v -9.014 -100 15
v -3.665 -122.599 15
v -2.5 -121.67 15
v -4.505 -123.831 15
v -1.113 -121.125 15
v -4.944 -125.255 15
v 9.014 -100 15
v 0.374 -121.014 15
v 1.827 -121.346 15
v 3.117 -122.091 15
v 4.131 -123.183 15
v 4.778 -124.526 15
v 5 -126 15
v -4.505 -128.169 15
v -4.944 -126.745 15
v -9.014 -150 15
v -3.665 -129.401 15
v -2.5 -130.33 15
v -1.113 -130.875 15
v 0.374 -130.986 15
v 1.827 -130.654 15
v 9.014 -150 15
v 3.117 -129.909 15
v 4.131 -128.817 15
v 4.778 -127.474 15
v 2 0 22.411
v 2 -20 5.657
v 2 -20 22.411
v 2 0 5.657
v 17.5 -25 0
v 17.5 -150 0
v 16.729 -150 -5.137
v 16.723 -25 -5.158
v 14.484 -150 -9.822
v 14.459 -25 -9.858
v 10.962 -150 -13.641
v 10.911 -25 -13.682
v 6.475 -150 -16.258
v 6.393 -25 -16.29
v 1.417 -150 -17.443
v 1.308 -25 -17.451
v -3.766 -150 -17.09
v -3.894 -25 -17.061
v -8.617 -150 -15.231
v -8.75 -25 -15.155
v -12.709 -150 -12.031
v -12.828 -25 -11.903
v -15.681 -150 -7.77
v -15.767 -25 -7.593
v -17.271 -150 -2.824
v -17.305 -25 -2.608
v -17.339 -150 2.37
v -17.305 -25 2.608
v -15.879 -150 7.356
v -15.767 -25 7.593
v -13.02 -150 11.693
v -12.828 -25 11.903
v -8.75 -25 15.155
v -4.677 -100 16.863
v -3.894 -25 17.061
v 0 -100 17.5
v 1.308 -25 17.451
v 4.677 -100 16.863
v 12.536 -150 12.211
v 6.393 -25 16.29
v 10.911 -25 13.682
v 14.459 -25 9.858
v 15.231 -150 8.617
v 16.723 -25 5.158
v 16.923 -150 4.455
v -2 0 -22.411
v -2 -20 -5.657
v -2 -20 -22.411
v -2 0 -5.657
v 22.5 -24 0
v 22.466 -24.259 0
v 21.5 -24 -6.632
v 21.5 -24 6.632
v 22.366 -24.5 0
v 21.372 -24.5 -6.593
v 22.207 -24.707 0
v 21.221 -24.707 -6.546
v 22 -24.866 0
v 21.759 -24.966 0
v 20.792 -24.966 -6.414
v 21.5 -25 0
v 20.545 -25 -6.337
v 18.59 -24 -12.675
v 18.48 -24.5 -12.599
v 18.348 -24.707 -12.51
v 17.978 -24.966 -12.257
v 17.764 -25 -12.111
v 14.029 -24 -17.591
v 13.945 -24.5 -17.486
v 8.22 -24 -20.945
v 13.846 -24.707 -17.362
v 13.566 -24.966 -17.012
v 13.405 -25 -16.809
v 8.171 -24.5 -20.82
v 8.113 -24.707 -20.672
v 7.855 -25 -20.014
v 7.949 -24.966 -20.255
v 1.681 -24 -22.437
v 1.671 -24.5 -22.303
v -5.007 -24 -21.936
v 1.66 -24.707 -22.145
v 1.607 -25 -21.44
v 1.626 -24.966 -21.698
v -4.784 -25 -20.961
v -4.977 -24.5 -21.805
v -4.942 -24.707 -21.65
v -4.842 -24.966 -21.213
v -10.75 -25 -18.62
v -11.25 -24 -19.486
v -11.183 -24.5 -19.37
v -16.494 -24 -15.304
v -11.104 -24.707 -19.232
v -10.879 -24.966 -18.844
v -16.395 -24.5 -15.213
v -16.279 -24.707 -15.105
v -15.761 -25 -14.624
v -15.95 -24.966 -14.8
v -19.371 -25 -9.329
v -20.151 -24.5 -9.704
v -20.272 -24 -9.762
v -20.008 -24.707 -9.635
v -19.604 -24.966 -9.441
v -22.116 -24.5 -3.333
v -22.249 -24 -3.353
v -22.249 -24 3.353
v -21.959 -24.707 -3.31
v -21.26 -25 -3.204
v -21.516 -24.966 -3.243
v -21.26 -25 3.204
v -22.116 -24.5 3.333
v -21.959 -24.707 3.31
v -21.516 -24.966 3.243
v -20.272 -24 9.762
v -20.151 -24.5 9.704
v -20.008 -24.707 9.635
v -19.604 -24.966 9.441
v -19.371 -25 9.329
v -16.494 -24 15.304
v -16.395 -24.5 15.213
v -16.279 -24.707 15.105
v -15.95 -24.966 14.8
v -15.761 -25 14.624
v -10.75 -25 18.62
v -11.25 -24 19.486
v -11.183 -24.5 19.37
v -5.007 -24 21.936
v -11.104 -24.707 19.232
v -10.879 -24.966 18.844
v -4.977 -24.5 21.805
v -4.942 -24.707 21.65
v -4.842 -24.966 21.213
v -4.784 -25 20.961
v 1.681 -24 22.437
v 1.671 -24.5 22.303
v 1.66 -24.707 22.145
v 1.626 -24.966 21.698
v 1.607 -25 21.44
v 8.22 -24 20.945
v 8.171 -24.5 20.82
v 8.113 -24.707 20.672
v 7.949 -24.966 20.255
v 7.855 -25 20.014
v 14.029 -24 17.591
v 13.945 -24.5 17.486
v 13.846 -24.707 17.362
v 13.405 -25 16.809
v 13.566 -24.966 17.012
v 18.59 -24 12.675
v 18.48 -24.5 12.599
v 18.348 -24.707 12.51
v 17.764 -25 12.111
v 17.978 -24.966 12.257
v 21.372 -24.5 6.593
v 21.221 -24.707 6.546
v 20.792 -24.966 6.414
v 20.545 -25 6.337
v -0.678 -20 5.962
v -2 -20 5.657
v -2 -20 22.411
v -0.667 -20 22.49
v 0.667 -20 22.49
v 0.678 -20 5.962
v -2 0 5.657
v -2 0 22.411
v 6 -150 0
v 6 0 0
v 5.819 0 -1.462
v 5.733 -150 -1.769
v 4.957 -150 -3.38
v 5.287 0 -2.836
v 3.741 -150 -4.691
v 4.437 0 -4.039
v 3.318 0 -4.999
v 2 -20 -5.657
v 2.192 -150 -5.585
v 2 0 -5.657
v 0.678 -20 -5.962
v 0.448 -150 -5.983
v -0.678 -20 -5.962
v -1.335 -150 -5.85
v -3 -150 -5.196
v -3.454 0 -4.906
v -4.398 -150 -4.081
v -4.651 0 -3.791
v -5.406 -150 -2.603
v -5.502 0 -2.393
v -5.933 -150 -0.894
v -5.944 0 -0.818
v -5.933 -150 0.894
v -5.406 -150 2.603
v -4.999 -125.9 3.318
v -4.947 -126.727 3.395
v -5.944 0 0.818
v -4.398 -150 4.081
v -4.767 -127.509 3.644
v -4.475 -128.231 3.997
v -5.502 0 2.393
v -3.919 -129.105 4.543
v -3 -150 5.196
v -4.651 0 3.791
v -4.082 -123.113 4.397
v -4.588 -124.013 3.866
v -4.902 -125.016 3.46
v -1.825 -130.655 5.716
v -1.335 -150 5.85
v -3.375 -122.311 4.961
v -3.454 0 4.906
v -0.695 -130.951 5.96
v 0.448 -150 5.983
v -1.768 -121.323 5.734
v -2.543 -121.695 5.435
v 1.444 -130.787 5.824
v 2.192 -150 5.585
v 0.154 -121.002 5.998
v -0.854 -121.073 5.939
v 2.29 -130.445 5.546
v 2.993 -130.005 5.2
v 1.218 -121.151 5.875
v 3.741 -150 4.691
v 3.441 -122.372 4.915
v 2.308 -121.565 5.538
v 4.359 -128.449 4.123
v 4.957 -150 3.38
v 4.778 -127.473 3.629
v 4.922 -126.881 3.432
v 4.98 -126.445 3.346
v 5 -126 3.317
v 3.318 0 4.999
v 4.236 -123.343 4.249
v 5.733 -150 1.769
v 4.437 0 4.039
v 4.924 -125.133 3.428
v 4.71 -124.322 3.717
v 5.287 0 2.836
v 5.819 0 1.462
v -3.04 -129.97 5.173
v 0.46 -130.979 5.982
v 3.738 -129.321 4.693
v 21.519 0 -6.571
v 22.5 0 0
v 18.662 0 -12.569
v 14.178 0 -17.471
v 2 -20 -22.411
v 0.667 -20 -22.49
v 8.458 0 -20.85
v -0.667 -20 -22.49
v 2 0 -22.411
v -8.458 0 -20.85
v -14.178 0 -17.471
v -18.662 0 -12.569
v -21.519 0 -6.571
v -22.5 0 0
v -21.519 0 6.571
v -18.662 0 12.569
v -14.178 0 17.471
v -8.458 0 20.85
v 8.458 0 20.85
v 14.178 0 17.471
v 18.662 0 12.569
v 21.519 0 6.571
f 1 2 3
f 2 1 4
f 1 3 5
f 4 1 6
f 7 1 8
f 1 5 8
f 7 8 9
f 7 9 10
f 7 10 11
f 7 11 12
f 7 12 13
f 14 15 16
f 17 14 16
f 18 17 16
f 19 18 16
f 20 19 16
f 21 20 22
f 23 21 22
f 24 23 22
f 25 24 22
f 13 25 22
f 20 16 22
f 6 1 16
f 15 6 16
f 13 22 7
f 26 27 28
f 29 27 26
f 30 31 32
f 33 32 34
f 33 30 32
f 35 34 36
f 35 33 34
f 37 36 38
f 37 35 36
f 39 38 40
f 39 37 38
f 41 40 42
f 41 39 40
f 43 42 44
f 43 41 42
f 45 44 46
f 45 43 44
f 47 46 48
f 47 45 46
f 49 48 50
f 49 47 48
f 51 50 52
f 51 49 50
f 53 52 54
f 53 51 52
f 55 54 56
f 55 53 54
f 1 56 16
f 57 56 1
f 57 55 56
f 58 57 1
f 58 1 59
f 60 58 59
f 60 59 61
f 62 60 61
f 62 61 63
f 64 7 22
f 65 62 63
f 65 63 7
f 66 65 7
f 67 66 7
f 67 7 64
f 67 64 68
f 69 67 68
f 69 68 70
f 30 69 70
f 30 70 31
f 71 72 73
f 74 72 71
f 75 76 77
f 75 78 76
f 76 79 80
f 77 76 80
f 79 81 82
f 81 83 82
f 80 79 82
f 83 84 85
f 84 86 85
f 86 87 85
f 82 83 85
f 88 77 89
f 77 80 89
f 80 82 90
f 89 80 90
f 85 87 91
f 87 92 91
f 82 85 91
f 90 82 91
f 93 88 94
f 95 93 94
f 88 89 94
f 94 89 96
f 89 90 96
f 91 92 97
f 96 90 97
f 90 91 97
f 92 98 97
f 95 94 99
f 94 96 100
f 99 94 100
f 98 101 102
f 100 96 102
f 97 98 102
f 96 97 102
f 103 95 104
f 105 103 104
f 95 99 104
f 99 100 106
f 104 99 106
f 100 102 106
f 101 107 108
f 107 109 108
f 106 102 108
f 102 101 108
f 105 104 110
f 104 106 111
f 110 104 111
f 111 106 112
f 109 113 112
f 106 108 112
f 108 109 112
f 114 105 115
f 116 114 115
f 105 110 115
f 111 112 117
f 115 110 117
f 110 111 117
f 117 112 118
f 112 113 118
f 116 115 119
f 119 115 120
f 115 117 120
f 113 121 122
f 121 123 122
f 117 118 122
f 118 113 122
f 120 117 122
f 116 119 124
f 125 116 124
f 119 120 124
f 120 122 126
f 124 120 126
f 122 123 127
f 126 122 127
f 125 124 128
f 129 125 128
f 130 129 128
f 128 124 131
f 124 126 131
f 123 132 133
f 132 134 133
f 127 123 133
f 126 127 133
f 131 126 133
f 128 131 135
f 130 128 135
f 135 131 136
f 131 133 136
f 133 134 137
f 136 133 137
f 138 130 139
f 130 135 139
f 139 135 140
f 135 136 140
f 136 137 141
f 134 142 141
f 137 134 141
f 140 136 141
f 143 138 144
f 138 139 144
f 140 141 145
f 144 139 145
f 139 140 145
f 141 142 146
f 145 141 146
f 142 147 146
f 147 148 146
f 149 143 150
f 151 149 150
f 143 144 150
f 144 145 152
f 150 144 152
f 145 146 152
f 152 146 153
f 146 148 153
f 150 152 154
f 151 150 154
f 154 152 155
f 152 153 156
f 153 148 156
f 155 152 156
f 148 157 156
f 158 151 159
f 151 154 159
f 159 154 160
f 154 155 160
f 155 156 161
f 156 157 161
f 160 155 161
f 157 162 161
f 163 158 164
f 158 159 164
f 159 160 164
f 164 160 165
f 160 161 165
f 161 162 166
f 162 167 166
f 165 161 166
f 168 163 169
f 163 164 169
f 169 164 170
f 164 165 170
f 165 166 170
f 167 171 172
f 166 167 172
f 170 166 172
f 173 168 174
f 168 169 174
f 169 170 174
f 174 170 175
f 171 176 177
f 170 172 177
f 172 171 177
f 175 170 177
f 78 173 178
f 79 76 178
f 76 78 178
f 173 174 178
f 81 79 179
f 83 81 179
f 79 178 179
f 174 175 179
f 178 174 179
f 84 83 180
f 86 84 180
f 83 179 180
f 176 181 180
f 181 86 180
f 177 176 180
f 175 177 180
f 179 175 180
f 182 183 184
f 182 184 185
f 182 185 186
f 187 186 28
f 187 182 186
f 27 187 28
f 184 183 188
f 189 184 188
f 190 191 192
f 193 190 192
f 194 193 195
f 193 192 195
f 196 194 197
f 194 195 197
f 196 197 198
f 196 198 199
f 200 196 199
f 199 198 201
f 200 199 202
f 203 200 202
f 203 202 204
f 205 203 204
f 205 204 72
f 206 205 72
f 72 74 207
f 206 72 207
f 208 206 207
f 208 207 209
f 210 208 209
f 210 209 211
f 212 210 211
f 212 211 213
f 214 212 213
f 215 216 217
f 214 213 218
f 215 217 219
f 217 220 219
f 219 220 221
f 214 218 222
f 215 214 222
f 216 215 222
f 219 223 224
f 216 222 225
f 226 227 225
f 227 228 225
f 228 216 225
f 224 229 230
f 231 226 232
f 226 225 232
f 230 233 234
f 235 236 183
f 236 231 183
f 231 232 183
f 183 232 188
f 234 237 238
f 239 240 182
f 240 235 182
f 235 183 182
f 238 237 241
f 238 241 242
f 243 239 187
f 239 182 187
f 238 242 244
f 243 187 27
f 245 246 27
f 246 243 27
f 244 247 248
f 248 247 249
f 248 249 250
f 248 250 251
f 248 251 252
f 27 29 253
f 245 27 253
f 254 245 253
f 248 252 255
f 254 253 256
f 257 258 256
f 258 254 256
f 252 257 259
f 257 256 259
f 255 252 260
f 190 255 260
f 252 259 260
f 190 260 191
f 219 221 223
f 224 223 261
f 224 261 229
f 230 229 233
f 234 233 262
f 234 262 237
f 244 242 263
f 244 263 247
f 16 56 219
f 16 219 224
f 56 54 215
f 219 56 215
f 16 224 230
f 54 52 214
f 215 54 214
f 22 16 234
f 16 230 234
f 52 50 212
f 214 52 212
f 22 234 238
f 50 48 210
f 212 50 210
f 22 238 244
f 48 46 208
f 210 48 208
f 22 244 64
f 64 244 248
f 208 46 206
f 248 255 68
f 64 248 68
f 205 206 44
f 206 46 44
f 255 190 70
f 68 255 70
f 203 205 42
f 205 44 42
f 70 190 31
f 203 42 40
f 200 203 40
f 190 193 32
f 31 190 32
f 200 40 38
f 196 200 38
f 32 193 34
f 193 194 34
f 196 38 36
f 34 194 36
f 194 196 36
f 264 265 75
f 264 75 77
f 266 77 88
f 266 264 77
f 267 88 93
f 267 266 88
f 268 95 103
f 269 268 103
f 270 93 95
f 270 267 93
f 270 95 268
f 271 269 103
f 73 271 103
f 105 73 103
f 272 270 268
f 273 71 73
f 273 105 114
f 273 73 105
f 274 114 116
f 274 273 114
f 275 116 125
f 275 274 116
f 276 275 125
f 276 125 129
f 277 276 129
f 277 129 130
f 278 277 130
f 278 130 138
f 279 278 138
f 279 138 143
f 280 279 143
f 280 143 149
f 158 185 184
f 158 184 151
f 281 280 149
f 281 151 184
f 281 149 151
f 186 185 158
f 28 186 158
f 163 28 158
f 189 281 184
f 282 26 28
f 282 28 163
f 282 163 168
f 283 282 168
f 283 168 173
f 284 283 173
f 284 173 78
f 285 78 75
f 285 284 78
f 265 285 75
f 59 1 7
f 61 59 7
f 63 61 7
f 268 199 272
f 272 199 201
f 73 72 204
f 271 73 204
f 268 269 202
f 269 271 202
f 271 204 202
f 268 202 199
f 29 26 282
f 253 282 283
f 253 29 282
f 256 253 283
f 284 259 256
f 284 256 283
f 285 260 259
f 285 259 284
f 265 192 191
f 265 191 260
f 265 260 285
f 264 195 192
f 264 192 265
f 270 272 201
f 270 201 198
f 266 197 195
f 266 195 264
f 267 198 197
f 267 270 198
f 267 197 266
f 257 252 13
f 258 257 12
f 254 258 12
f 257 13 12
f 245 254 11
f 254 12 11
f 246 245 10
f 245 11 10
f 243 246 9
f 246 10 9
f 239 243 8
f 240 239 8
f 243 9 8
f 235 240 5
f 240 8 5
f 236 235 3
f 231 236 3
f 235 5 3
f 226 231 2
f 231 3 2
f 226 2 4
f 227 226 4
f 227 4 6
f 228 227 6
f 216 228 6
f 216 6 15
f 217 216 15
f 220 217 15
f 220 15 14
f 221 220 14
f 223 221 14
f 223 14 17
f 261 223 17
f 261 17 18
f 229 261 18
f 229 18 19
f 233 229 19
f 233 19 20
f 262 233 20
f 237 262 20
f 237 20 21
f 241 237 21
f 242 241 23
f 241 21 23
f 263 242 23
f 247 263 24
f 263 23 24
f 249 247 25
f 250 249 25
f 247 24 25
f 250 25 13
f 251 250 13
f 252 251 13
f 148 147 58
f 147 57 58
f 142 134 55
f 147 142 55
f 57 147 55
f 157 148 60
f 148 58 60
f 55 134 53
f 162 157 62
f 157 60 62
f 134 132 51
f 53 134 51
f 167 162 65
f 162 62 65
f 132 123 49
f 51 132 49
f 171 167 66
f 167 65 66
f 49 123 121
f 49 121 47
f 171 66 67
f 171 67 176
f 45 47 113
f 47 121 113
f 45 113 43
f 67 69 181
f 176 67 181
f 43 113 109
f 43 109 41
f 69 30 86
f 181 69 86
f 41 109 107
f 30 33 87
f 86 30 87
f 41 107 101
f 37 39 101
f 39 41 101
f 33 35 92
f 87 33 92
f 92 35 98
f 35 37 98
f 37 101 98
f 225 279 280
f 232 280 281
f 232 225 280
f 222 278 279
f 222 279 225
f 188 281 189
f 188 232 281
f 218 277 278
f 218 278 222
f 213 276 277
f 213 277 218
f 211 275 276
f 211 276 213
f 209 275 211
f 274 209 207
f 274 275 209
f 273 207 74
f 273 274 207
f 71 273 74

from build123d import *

# Parameters (mm, degrees)
STOCKDIAMETER_R        = 22.5
BASESTOCK_DEPTH        = 150
DIAMETERCUT_START      = -25
SKETCH11_OUTSIDE_W     = 79.588
SKETCH11_OUTSIDE_H     = 79.588
SKETCH11_OUTSIDE_R     = 17.5
DIAMETERCUT_DEPTH      = 126
SHAFTHOLE_R            = 6
MOTOR1SHAFTHOLE_DEPTH  = 151
SKETCH10_W             = 4
SKETCH10_H             = 20
SHAFTKEY_DEPTH         = 23.5
SHAFTKEY_DEPTH_BACK    = 23.5
ARMKEY_START           = -150
ARMKEYSKETCH_W         = 60
ARMKEYSKETCH_H         = 20
ARMKEY_DEPTH           = 50
ARM1MOUNTINGHOLE_START = 15
SKETCH13_R             = 5
ARM1MOUNTINGHOLE_DEPTH = 11.683375
FILLET1_R              = 1


with BuildPart() as part:
    # StockDiameter → BaseStock (new body)
    with BuildSketch(Plane(origin=(0, 0, 0), x_dir=(1, 0, 0), z_dir=(0, 1, 0))):
        Circle(STOCKDIAMETER_R)
    extrude(amount=-BASESTOCK_DEPTH)

    # Sketch11 outside → DiameterCut (cut, through all)
    with BuildSketch(Plane(origin=(0, 0, 0), x_dir=(1, 0, 0), z_dir=(0, 1, 0)).offset(DIAMETERCUT_START)):
        Rectangle(SKETCH11_OUTSIDE_W, SKETCH11_OUTSIDE_H)
        Circle(SKETCH11_OUTSIDE_R, mode=Mode.SUBTRACT)
    extrude(amount=-DIAMETERCUT_DEPTH, mode=Mode.SUBTRACT)

    # ShaftHole → Motor1ShaftHole (cut, through all)
    with BuildSketch(Plane(origin=(0, 0, 0), x_dir=(1, 0, 0), z_dir=(0, 1, 0))):
        Circle(SHAFTHOLE_R)
    extrude(amount=-MOTOR1SHAFTHOLE_DEPTH, mode=Mode.SUBTRACT)

    # Sketch10 → ShaftKey (cut, two sides)
    with BuildSketch(Plane.XY) as shaftkey_sk:
        with Locations((0, -10)):
            Rectangle(SKETCH10_W, SKETCH10_H)
    extrude(amount=SHAFTKEY_DEPTH, mode=Mode.SUBTRACT)
    extrude(shaftkey_sk.sketch, amount=-SHAFTKEY_DEPTH_BACK, mode=Mode.SUBTRACT)

    # ArmKeySketch → ArmKey (cut)
    with BuildSketch(Plane(origin=(0, 0, 0), x_dir=(1, 0, 0), z_dir=(0, 1, 0)).offset(ARMKEY_START)):
        with Locations((0, -25)):
            Rectangle(ARMKEYSKETCH_W, ARMKEYSKETCH_H)
    extrude(amount=ARMKEY_DEPTH, mode=Mode.SUBTRACT)

    # Sketch13 → Arm1MountingHole (cut)
    with BuildSketch(Plane.XY.offset(ARM1MOUNTINGHOLE_START)):
        with Locations((0, -126)):
            Circle(SKETCH13_R)
    extrude(amount=-ARM1MOUNTINGHOLE_DEPTH, mode=Mode.SUBTRACT)

    # Fillet1
    fillet1_edges = [part.edges().sort_by_distance(p)[0] for p in [
        (-22.5, -25, 0),
    ]]
    fillet(fillet1_edges, radius=FILLET1_R)


solid = part.part
